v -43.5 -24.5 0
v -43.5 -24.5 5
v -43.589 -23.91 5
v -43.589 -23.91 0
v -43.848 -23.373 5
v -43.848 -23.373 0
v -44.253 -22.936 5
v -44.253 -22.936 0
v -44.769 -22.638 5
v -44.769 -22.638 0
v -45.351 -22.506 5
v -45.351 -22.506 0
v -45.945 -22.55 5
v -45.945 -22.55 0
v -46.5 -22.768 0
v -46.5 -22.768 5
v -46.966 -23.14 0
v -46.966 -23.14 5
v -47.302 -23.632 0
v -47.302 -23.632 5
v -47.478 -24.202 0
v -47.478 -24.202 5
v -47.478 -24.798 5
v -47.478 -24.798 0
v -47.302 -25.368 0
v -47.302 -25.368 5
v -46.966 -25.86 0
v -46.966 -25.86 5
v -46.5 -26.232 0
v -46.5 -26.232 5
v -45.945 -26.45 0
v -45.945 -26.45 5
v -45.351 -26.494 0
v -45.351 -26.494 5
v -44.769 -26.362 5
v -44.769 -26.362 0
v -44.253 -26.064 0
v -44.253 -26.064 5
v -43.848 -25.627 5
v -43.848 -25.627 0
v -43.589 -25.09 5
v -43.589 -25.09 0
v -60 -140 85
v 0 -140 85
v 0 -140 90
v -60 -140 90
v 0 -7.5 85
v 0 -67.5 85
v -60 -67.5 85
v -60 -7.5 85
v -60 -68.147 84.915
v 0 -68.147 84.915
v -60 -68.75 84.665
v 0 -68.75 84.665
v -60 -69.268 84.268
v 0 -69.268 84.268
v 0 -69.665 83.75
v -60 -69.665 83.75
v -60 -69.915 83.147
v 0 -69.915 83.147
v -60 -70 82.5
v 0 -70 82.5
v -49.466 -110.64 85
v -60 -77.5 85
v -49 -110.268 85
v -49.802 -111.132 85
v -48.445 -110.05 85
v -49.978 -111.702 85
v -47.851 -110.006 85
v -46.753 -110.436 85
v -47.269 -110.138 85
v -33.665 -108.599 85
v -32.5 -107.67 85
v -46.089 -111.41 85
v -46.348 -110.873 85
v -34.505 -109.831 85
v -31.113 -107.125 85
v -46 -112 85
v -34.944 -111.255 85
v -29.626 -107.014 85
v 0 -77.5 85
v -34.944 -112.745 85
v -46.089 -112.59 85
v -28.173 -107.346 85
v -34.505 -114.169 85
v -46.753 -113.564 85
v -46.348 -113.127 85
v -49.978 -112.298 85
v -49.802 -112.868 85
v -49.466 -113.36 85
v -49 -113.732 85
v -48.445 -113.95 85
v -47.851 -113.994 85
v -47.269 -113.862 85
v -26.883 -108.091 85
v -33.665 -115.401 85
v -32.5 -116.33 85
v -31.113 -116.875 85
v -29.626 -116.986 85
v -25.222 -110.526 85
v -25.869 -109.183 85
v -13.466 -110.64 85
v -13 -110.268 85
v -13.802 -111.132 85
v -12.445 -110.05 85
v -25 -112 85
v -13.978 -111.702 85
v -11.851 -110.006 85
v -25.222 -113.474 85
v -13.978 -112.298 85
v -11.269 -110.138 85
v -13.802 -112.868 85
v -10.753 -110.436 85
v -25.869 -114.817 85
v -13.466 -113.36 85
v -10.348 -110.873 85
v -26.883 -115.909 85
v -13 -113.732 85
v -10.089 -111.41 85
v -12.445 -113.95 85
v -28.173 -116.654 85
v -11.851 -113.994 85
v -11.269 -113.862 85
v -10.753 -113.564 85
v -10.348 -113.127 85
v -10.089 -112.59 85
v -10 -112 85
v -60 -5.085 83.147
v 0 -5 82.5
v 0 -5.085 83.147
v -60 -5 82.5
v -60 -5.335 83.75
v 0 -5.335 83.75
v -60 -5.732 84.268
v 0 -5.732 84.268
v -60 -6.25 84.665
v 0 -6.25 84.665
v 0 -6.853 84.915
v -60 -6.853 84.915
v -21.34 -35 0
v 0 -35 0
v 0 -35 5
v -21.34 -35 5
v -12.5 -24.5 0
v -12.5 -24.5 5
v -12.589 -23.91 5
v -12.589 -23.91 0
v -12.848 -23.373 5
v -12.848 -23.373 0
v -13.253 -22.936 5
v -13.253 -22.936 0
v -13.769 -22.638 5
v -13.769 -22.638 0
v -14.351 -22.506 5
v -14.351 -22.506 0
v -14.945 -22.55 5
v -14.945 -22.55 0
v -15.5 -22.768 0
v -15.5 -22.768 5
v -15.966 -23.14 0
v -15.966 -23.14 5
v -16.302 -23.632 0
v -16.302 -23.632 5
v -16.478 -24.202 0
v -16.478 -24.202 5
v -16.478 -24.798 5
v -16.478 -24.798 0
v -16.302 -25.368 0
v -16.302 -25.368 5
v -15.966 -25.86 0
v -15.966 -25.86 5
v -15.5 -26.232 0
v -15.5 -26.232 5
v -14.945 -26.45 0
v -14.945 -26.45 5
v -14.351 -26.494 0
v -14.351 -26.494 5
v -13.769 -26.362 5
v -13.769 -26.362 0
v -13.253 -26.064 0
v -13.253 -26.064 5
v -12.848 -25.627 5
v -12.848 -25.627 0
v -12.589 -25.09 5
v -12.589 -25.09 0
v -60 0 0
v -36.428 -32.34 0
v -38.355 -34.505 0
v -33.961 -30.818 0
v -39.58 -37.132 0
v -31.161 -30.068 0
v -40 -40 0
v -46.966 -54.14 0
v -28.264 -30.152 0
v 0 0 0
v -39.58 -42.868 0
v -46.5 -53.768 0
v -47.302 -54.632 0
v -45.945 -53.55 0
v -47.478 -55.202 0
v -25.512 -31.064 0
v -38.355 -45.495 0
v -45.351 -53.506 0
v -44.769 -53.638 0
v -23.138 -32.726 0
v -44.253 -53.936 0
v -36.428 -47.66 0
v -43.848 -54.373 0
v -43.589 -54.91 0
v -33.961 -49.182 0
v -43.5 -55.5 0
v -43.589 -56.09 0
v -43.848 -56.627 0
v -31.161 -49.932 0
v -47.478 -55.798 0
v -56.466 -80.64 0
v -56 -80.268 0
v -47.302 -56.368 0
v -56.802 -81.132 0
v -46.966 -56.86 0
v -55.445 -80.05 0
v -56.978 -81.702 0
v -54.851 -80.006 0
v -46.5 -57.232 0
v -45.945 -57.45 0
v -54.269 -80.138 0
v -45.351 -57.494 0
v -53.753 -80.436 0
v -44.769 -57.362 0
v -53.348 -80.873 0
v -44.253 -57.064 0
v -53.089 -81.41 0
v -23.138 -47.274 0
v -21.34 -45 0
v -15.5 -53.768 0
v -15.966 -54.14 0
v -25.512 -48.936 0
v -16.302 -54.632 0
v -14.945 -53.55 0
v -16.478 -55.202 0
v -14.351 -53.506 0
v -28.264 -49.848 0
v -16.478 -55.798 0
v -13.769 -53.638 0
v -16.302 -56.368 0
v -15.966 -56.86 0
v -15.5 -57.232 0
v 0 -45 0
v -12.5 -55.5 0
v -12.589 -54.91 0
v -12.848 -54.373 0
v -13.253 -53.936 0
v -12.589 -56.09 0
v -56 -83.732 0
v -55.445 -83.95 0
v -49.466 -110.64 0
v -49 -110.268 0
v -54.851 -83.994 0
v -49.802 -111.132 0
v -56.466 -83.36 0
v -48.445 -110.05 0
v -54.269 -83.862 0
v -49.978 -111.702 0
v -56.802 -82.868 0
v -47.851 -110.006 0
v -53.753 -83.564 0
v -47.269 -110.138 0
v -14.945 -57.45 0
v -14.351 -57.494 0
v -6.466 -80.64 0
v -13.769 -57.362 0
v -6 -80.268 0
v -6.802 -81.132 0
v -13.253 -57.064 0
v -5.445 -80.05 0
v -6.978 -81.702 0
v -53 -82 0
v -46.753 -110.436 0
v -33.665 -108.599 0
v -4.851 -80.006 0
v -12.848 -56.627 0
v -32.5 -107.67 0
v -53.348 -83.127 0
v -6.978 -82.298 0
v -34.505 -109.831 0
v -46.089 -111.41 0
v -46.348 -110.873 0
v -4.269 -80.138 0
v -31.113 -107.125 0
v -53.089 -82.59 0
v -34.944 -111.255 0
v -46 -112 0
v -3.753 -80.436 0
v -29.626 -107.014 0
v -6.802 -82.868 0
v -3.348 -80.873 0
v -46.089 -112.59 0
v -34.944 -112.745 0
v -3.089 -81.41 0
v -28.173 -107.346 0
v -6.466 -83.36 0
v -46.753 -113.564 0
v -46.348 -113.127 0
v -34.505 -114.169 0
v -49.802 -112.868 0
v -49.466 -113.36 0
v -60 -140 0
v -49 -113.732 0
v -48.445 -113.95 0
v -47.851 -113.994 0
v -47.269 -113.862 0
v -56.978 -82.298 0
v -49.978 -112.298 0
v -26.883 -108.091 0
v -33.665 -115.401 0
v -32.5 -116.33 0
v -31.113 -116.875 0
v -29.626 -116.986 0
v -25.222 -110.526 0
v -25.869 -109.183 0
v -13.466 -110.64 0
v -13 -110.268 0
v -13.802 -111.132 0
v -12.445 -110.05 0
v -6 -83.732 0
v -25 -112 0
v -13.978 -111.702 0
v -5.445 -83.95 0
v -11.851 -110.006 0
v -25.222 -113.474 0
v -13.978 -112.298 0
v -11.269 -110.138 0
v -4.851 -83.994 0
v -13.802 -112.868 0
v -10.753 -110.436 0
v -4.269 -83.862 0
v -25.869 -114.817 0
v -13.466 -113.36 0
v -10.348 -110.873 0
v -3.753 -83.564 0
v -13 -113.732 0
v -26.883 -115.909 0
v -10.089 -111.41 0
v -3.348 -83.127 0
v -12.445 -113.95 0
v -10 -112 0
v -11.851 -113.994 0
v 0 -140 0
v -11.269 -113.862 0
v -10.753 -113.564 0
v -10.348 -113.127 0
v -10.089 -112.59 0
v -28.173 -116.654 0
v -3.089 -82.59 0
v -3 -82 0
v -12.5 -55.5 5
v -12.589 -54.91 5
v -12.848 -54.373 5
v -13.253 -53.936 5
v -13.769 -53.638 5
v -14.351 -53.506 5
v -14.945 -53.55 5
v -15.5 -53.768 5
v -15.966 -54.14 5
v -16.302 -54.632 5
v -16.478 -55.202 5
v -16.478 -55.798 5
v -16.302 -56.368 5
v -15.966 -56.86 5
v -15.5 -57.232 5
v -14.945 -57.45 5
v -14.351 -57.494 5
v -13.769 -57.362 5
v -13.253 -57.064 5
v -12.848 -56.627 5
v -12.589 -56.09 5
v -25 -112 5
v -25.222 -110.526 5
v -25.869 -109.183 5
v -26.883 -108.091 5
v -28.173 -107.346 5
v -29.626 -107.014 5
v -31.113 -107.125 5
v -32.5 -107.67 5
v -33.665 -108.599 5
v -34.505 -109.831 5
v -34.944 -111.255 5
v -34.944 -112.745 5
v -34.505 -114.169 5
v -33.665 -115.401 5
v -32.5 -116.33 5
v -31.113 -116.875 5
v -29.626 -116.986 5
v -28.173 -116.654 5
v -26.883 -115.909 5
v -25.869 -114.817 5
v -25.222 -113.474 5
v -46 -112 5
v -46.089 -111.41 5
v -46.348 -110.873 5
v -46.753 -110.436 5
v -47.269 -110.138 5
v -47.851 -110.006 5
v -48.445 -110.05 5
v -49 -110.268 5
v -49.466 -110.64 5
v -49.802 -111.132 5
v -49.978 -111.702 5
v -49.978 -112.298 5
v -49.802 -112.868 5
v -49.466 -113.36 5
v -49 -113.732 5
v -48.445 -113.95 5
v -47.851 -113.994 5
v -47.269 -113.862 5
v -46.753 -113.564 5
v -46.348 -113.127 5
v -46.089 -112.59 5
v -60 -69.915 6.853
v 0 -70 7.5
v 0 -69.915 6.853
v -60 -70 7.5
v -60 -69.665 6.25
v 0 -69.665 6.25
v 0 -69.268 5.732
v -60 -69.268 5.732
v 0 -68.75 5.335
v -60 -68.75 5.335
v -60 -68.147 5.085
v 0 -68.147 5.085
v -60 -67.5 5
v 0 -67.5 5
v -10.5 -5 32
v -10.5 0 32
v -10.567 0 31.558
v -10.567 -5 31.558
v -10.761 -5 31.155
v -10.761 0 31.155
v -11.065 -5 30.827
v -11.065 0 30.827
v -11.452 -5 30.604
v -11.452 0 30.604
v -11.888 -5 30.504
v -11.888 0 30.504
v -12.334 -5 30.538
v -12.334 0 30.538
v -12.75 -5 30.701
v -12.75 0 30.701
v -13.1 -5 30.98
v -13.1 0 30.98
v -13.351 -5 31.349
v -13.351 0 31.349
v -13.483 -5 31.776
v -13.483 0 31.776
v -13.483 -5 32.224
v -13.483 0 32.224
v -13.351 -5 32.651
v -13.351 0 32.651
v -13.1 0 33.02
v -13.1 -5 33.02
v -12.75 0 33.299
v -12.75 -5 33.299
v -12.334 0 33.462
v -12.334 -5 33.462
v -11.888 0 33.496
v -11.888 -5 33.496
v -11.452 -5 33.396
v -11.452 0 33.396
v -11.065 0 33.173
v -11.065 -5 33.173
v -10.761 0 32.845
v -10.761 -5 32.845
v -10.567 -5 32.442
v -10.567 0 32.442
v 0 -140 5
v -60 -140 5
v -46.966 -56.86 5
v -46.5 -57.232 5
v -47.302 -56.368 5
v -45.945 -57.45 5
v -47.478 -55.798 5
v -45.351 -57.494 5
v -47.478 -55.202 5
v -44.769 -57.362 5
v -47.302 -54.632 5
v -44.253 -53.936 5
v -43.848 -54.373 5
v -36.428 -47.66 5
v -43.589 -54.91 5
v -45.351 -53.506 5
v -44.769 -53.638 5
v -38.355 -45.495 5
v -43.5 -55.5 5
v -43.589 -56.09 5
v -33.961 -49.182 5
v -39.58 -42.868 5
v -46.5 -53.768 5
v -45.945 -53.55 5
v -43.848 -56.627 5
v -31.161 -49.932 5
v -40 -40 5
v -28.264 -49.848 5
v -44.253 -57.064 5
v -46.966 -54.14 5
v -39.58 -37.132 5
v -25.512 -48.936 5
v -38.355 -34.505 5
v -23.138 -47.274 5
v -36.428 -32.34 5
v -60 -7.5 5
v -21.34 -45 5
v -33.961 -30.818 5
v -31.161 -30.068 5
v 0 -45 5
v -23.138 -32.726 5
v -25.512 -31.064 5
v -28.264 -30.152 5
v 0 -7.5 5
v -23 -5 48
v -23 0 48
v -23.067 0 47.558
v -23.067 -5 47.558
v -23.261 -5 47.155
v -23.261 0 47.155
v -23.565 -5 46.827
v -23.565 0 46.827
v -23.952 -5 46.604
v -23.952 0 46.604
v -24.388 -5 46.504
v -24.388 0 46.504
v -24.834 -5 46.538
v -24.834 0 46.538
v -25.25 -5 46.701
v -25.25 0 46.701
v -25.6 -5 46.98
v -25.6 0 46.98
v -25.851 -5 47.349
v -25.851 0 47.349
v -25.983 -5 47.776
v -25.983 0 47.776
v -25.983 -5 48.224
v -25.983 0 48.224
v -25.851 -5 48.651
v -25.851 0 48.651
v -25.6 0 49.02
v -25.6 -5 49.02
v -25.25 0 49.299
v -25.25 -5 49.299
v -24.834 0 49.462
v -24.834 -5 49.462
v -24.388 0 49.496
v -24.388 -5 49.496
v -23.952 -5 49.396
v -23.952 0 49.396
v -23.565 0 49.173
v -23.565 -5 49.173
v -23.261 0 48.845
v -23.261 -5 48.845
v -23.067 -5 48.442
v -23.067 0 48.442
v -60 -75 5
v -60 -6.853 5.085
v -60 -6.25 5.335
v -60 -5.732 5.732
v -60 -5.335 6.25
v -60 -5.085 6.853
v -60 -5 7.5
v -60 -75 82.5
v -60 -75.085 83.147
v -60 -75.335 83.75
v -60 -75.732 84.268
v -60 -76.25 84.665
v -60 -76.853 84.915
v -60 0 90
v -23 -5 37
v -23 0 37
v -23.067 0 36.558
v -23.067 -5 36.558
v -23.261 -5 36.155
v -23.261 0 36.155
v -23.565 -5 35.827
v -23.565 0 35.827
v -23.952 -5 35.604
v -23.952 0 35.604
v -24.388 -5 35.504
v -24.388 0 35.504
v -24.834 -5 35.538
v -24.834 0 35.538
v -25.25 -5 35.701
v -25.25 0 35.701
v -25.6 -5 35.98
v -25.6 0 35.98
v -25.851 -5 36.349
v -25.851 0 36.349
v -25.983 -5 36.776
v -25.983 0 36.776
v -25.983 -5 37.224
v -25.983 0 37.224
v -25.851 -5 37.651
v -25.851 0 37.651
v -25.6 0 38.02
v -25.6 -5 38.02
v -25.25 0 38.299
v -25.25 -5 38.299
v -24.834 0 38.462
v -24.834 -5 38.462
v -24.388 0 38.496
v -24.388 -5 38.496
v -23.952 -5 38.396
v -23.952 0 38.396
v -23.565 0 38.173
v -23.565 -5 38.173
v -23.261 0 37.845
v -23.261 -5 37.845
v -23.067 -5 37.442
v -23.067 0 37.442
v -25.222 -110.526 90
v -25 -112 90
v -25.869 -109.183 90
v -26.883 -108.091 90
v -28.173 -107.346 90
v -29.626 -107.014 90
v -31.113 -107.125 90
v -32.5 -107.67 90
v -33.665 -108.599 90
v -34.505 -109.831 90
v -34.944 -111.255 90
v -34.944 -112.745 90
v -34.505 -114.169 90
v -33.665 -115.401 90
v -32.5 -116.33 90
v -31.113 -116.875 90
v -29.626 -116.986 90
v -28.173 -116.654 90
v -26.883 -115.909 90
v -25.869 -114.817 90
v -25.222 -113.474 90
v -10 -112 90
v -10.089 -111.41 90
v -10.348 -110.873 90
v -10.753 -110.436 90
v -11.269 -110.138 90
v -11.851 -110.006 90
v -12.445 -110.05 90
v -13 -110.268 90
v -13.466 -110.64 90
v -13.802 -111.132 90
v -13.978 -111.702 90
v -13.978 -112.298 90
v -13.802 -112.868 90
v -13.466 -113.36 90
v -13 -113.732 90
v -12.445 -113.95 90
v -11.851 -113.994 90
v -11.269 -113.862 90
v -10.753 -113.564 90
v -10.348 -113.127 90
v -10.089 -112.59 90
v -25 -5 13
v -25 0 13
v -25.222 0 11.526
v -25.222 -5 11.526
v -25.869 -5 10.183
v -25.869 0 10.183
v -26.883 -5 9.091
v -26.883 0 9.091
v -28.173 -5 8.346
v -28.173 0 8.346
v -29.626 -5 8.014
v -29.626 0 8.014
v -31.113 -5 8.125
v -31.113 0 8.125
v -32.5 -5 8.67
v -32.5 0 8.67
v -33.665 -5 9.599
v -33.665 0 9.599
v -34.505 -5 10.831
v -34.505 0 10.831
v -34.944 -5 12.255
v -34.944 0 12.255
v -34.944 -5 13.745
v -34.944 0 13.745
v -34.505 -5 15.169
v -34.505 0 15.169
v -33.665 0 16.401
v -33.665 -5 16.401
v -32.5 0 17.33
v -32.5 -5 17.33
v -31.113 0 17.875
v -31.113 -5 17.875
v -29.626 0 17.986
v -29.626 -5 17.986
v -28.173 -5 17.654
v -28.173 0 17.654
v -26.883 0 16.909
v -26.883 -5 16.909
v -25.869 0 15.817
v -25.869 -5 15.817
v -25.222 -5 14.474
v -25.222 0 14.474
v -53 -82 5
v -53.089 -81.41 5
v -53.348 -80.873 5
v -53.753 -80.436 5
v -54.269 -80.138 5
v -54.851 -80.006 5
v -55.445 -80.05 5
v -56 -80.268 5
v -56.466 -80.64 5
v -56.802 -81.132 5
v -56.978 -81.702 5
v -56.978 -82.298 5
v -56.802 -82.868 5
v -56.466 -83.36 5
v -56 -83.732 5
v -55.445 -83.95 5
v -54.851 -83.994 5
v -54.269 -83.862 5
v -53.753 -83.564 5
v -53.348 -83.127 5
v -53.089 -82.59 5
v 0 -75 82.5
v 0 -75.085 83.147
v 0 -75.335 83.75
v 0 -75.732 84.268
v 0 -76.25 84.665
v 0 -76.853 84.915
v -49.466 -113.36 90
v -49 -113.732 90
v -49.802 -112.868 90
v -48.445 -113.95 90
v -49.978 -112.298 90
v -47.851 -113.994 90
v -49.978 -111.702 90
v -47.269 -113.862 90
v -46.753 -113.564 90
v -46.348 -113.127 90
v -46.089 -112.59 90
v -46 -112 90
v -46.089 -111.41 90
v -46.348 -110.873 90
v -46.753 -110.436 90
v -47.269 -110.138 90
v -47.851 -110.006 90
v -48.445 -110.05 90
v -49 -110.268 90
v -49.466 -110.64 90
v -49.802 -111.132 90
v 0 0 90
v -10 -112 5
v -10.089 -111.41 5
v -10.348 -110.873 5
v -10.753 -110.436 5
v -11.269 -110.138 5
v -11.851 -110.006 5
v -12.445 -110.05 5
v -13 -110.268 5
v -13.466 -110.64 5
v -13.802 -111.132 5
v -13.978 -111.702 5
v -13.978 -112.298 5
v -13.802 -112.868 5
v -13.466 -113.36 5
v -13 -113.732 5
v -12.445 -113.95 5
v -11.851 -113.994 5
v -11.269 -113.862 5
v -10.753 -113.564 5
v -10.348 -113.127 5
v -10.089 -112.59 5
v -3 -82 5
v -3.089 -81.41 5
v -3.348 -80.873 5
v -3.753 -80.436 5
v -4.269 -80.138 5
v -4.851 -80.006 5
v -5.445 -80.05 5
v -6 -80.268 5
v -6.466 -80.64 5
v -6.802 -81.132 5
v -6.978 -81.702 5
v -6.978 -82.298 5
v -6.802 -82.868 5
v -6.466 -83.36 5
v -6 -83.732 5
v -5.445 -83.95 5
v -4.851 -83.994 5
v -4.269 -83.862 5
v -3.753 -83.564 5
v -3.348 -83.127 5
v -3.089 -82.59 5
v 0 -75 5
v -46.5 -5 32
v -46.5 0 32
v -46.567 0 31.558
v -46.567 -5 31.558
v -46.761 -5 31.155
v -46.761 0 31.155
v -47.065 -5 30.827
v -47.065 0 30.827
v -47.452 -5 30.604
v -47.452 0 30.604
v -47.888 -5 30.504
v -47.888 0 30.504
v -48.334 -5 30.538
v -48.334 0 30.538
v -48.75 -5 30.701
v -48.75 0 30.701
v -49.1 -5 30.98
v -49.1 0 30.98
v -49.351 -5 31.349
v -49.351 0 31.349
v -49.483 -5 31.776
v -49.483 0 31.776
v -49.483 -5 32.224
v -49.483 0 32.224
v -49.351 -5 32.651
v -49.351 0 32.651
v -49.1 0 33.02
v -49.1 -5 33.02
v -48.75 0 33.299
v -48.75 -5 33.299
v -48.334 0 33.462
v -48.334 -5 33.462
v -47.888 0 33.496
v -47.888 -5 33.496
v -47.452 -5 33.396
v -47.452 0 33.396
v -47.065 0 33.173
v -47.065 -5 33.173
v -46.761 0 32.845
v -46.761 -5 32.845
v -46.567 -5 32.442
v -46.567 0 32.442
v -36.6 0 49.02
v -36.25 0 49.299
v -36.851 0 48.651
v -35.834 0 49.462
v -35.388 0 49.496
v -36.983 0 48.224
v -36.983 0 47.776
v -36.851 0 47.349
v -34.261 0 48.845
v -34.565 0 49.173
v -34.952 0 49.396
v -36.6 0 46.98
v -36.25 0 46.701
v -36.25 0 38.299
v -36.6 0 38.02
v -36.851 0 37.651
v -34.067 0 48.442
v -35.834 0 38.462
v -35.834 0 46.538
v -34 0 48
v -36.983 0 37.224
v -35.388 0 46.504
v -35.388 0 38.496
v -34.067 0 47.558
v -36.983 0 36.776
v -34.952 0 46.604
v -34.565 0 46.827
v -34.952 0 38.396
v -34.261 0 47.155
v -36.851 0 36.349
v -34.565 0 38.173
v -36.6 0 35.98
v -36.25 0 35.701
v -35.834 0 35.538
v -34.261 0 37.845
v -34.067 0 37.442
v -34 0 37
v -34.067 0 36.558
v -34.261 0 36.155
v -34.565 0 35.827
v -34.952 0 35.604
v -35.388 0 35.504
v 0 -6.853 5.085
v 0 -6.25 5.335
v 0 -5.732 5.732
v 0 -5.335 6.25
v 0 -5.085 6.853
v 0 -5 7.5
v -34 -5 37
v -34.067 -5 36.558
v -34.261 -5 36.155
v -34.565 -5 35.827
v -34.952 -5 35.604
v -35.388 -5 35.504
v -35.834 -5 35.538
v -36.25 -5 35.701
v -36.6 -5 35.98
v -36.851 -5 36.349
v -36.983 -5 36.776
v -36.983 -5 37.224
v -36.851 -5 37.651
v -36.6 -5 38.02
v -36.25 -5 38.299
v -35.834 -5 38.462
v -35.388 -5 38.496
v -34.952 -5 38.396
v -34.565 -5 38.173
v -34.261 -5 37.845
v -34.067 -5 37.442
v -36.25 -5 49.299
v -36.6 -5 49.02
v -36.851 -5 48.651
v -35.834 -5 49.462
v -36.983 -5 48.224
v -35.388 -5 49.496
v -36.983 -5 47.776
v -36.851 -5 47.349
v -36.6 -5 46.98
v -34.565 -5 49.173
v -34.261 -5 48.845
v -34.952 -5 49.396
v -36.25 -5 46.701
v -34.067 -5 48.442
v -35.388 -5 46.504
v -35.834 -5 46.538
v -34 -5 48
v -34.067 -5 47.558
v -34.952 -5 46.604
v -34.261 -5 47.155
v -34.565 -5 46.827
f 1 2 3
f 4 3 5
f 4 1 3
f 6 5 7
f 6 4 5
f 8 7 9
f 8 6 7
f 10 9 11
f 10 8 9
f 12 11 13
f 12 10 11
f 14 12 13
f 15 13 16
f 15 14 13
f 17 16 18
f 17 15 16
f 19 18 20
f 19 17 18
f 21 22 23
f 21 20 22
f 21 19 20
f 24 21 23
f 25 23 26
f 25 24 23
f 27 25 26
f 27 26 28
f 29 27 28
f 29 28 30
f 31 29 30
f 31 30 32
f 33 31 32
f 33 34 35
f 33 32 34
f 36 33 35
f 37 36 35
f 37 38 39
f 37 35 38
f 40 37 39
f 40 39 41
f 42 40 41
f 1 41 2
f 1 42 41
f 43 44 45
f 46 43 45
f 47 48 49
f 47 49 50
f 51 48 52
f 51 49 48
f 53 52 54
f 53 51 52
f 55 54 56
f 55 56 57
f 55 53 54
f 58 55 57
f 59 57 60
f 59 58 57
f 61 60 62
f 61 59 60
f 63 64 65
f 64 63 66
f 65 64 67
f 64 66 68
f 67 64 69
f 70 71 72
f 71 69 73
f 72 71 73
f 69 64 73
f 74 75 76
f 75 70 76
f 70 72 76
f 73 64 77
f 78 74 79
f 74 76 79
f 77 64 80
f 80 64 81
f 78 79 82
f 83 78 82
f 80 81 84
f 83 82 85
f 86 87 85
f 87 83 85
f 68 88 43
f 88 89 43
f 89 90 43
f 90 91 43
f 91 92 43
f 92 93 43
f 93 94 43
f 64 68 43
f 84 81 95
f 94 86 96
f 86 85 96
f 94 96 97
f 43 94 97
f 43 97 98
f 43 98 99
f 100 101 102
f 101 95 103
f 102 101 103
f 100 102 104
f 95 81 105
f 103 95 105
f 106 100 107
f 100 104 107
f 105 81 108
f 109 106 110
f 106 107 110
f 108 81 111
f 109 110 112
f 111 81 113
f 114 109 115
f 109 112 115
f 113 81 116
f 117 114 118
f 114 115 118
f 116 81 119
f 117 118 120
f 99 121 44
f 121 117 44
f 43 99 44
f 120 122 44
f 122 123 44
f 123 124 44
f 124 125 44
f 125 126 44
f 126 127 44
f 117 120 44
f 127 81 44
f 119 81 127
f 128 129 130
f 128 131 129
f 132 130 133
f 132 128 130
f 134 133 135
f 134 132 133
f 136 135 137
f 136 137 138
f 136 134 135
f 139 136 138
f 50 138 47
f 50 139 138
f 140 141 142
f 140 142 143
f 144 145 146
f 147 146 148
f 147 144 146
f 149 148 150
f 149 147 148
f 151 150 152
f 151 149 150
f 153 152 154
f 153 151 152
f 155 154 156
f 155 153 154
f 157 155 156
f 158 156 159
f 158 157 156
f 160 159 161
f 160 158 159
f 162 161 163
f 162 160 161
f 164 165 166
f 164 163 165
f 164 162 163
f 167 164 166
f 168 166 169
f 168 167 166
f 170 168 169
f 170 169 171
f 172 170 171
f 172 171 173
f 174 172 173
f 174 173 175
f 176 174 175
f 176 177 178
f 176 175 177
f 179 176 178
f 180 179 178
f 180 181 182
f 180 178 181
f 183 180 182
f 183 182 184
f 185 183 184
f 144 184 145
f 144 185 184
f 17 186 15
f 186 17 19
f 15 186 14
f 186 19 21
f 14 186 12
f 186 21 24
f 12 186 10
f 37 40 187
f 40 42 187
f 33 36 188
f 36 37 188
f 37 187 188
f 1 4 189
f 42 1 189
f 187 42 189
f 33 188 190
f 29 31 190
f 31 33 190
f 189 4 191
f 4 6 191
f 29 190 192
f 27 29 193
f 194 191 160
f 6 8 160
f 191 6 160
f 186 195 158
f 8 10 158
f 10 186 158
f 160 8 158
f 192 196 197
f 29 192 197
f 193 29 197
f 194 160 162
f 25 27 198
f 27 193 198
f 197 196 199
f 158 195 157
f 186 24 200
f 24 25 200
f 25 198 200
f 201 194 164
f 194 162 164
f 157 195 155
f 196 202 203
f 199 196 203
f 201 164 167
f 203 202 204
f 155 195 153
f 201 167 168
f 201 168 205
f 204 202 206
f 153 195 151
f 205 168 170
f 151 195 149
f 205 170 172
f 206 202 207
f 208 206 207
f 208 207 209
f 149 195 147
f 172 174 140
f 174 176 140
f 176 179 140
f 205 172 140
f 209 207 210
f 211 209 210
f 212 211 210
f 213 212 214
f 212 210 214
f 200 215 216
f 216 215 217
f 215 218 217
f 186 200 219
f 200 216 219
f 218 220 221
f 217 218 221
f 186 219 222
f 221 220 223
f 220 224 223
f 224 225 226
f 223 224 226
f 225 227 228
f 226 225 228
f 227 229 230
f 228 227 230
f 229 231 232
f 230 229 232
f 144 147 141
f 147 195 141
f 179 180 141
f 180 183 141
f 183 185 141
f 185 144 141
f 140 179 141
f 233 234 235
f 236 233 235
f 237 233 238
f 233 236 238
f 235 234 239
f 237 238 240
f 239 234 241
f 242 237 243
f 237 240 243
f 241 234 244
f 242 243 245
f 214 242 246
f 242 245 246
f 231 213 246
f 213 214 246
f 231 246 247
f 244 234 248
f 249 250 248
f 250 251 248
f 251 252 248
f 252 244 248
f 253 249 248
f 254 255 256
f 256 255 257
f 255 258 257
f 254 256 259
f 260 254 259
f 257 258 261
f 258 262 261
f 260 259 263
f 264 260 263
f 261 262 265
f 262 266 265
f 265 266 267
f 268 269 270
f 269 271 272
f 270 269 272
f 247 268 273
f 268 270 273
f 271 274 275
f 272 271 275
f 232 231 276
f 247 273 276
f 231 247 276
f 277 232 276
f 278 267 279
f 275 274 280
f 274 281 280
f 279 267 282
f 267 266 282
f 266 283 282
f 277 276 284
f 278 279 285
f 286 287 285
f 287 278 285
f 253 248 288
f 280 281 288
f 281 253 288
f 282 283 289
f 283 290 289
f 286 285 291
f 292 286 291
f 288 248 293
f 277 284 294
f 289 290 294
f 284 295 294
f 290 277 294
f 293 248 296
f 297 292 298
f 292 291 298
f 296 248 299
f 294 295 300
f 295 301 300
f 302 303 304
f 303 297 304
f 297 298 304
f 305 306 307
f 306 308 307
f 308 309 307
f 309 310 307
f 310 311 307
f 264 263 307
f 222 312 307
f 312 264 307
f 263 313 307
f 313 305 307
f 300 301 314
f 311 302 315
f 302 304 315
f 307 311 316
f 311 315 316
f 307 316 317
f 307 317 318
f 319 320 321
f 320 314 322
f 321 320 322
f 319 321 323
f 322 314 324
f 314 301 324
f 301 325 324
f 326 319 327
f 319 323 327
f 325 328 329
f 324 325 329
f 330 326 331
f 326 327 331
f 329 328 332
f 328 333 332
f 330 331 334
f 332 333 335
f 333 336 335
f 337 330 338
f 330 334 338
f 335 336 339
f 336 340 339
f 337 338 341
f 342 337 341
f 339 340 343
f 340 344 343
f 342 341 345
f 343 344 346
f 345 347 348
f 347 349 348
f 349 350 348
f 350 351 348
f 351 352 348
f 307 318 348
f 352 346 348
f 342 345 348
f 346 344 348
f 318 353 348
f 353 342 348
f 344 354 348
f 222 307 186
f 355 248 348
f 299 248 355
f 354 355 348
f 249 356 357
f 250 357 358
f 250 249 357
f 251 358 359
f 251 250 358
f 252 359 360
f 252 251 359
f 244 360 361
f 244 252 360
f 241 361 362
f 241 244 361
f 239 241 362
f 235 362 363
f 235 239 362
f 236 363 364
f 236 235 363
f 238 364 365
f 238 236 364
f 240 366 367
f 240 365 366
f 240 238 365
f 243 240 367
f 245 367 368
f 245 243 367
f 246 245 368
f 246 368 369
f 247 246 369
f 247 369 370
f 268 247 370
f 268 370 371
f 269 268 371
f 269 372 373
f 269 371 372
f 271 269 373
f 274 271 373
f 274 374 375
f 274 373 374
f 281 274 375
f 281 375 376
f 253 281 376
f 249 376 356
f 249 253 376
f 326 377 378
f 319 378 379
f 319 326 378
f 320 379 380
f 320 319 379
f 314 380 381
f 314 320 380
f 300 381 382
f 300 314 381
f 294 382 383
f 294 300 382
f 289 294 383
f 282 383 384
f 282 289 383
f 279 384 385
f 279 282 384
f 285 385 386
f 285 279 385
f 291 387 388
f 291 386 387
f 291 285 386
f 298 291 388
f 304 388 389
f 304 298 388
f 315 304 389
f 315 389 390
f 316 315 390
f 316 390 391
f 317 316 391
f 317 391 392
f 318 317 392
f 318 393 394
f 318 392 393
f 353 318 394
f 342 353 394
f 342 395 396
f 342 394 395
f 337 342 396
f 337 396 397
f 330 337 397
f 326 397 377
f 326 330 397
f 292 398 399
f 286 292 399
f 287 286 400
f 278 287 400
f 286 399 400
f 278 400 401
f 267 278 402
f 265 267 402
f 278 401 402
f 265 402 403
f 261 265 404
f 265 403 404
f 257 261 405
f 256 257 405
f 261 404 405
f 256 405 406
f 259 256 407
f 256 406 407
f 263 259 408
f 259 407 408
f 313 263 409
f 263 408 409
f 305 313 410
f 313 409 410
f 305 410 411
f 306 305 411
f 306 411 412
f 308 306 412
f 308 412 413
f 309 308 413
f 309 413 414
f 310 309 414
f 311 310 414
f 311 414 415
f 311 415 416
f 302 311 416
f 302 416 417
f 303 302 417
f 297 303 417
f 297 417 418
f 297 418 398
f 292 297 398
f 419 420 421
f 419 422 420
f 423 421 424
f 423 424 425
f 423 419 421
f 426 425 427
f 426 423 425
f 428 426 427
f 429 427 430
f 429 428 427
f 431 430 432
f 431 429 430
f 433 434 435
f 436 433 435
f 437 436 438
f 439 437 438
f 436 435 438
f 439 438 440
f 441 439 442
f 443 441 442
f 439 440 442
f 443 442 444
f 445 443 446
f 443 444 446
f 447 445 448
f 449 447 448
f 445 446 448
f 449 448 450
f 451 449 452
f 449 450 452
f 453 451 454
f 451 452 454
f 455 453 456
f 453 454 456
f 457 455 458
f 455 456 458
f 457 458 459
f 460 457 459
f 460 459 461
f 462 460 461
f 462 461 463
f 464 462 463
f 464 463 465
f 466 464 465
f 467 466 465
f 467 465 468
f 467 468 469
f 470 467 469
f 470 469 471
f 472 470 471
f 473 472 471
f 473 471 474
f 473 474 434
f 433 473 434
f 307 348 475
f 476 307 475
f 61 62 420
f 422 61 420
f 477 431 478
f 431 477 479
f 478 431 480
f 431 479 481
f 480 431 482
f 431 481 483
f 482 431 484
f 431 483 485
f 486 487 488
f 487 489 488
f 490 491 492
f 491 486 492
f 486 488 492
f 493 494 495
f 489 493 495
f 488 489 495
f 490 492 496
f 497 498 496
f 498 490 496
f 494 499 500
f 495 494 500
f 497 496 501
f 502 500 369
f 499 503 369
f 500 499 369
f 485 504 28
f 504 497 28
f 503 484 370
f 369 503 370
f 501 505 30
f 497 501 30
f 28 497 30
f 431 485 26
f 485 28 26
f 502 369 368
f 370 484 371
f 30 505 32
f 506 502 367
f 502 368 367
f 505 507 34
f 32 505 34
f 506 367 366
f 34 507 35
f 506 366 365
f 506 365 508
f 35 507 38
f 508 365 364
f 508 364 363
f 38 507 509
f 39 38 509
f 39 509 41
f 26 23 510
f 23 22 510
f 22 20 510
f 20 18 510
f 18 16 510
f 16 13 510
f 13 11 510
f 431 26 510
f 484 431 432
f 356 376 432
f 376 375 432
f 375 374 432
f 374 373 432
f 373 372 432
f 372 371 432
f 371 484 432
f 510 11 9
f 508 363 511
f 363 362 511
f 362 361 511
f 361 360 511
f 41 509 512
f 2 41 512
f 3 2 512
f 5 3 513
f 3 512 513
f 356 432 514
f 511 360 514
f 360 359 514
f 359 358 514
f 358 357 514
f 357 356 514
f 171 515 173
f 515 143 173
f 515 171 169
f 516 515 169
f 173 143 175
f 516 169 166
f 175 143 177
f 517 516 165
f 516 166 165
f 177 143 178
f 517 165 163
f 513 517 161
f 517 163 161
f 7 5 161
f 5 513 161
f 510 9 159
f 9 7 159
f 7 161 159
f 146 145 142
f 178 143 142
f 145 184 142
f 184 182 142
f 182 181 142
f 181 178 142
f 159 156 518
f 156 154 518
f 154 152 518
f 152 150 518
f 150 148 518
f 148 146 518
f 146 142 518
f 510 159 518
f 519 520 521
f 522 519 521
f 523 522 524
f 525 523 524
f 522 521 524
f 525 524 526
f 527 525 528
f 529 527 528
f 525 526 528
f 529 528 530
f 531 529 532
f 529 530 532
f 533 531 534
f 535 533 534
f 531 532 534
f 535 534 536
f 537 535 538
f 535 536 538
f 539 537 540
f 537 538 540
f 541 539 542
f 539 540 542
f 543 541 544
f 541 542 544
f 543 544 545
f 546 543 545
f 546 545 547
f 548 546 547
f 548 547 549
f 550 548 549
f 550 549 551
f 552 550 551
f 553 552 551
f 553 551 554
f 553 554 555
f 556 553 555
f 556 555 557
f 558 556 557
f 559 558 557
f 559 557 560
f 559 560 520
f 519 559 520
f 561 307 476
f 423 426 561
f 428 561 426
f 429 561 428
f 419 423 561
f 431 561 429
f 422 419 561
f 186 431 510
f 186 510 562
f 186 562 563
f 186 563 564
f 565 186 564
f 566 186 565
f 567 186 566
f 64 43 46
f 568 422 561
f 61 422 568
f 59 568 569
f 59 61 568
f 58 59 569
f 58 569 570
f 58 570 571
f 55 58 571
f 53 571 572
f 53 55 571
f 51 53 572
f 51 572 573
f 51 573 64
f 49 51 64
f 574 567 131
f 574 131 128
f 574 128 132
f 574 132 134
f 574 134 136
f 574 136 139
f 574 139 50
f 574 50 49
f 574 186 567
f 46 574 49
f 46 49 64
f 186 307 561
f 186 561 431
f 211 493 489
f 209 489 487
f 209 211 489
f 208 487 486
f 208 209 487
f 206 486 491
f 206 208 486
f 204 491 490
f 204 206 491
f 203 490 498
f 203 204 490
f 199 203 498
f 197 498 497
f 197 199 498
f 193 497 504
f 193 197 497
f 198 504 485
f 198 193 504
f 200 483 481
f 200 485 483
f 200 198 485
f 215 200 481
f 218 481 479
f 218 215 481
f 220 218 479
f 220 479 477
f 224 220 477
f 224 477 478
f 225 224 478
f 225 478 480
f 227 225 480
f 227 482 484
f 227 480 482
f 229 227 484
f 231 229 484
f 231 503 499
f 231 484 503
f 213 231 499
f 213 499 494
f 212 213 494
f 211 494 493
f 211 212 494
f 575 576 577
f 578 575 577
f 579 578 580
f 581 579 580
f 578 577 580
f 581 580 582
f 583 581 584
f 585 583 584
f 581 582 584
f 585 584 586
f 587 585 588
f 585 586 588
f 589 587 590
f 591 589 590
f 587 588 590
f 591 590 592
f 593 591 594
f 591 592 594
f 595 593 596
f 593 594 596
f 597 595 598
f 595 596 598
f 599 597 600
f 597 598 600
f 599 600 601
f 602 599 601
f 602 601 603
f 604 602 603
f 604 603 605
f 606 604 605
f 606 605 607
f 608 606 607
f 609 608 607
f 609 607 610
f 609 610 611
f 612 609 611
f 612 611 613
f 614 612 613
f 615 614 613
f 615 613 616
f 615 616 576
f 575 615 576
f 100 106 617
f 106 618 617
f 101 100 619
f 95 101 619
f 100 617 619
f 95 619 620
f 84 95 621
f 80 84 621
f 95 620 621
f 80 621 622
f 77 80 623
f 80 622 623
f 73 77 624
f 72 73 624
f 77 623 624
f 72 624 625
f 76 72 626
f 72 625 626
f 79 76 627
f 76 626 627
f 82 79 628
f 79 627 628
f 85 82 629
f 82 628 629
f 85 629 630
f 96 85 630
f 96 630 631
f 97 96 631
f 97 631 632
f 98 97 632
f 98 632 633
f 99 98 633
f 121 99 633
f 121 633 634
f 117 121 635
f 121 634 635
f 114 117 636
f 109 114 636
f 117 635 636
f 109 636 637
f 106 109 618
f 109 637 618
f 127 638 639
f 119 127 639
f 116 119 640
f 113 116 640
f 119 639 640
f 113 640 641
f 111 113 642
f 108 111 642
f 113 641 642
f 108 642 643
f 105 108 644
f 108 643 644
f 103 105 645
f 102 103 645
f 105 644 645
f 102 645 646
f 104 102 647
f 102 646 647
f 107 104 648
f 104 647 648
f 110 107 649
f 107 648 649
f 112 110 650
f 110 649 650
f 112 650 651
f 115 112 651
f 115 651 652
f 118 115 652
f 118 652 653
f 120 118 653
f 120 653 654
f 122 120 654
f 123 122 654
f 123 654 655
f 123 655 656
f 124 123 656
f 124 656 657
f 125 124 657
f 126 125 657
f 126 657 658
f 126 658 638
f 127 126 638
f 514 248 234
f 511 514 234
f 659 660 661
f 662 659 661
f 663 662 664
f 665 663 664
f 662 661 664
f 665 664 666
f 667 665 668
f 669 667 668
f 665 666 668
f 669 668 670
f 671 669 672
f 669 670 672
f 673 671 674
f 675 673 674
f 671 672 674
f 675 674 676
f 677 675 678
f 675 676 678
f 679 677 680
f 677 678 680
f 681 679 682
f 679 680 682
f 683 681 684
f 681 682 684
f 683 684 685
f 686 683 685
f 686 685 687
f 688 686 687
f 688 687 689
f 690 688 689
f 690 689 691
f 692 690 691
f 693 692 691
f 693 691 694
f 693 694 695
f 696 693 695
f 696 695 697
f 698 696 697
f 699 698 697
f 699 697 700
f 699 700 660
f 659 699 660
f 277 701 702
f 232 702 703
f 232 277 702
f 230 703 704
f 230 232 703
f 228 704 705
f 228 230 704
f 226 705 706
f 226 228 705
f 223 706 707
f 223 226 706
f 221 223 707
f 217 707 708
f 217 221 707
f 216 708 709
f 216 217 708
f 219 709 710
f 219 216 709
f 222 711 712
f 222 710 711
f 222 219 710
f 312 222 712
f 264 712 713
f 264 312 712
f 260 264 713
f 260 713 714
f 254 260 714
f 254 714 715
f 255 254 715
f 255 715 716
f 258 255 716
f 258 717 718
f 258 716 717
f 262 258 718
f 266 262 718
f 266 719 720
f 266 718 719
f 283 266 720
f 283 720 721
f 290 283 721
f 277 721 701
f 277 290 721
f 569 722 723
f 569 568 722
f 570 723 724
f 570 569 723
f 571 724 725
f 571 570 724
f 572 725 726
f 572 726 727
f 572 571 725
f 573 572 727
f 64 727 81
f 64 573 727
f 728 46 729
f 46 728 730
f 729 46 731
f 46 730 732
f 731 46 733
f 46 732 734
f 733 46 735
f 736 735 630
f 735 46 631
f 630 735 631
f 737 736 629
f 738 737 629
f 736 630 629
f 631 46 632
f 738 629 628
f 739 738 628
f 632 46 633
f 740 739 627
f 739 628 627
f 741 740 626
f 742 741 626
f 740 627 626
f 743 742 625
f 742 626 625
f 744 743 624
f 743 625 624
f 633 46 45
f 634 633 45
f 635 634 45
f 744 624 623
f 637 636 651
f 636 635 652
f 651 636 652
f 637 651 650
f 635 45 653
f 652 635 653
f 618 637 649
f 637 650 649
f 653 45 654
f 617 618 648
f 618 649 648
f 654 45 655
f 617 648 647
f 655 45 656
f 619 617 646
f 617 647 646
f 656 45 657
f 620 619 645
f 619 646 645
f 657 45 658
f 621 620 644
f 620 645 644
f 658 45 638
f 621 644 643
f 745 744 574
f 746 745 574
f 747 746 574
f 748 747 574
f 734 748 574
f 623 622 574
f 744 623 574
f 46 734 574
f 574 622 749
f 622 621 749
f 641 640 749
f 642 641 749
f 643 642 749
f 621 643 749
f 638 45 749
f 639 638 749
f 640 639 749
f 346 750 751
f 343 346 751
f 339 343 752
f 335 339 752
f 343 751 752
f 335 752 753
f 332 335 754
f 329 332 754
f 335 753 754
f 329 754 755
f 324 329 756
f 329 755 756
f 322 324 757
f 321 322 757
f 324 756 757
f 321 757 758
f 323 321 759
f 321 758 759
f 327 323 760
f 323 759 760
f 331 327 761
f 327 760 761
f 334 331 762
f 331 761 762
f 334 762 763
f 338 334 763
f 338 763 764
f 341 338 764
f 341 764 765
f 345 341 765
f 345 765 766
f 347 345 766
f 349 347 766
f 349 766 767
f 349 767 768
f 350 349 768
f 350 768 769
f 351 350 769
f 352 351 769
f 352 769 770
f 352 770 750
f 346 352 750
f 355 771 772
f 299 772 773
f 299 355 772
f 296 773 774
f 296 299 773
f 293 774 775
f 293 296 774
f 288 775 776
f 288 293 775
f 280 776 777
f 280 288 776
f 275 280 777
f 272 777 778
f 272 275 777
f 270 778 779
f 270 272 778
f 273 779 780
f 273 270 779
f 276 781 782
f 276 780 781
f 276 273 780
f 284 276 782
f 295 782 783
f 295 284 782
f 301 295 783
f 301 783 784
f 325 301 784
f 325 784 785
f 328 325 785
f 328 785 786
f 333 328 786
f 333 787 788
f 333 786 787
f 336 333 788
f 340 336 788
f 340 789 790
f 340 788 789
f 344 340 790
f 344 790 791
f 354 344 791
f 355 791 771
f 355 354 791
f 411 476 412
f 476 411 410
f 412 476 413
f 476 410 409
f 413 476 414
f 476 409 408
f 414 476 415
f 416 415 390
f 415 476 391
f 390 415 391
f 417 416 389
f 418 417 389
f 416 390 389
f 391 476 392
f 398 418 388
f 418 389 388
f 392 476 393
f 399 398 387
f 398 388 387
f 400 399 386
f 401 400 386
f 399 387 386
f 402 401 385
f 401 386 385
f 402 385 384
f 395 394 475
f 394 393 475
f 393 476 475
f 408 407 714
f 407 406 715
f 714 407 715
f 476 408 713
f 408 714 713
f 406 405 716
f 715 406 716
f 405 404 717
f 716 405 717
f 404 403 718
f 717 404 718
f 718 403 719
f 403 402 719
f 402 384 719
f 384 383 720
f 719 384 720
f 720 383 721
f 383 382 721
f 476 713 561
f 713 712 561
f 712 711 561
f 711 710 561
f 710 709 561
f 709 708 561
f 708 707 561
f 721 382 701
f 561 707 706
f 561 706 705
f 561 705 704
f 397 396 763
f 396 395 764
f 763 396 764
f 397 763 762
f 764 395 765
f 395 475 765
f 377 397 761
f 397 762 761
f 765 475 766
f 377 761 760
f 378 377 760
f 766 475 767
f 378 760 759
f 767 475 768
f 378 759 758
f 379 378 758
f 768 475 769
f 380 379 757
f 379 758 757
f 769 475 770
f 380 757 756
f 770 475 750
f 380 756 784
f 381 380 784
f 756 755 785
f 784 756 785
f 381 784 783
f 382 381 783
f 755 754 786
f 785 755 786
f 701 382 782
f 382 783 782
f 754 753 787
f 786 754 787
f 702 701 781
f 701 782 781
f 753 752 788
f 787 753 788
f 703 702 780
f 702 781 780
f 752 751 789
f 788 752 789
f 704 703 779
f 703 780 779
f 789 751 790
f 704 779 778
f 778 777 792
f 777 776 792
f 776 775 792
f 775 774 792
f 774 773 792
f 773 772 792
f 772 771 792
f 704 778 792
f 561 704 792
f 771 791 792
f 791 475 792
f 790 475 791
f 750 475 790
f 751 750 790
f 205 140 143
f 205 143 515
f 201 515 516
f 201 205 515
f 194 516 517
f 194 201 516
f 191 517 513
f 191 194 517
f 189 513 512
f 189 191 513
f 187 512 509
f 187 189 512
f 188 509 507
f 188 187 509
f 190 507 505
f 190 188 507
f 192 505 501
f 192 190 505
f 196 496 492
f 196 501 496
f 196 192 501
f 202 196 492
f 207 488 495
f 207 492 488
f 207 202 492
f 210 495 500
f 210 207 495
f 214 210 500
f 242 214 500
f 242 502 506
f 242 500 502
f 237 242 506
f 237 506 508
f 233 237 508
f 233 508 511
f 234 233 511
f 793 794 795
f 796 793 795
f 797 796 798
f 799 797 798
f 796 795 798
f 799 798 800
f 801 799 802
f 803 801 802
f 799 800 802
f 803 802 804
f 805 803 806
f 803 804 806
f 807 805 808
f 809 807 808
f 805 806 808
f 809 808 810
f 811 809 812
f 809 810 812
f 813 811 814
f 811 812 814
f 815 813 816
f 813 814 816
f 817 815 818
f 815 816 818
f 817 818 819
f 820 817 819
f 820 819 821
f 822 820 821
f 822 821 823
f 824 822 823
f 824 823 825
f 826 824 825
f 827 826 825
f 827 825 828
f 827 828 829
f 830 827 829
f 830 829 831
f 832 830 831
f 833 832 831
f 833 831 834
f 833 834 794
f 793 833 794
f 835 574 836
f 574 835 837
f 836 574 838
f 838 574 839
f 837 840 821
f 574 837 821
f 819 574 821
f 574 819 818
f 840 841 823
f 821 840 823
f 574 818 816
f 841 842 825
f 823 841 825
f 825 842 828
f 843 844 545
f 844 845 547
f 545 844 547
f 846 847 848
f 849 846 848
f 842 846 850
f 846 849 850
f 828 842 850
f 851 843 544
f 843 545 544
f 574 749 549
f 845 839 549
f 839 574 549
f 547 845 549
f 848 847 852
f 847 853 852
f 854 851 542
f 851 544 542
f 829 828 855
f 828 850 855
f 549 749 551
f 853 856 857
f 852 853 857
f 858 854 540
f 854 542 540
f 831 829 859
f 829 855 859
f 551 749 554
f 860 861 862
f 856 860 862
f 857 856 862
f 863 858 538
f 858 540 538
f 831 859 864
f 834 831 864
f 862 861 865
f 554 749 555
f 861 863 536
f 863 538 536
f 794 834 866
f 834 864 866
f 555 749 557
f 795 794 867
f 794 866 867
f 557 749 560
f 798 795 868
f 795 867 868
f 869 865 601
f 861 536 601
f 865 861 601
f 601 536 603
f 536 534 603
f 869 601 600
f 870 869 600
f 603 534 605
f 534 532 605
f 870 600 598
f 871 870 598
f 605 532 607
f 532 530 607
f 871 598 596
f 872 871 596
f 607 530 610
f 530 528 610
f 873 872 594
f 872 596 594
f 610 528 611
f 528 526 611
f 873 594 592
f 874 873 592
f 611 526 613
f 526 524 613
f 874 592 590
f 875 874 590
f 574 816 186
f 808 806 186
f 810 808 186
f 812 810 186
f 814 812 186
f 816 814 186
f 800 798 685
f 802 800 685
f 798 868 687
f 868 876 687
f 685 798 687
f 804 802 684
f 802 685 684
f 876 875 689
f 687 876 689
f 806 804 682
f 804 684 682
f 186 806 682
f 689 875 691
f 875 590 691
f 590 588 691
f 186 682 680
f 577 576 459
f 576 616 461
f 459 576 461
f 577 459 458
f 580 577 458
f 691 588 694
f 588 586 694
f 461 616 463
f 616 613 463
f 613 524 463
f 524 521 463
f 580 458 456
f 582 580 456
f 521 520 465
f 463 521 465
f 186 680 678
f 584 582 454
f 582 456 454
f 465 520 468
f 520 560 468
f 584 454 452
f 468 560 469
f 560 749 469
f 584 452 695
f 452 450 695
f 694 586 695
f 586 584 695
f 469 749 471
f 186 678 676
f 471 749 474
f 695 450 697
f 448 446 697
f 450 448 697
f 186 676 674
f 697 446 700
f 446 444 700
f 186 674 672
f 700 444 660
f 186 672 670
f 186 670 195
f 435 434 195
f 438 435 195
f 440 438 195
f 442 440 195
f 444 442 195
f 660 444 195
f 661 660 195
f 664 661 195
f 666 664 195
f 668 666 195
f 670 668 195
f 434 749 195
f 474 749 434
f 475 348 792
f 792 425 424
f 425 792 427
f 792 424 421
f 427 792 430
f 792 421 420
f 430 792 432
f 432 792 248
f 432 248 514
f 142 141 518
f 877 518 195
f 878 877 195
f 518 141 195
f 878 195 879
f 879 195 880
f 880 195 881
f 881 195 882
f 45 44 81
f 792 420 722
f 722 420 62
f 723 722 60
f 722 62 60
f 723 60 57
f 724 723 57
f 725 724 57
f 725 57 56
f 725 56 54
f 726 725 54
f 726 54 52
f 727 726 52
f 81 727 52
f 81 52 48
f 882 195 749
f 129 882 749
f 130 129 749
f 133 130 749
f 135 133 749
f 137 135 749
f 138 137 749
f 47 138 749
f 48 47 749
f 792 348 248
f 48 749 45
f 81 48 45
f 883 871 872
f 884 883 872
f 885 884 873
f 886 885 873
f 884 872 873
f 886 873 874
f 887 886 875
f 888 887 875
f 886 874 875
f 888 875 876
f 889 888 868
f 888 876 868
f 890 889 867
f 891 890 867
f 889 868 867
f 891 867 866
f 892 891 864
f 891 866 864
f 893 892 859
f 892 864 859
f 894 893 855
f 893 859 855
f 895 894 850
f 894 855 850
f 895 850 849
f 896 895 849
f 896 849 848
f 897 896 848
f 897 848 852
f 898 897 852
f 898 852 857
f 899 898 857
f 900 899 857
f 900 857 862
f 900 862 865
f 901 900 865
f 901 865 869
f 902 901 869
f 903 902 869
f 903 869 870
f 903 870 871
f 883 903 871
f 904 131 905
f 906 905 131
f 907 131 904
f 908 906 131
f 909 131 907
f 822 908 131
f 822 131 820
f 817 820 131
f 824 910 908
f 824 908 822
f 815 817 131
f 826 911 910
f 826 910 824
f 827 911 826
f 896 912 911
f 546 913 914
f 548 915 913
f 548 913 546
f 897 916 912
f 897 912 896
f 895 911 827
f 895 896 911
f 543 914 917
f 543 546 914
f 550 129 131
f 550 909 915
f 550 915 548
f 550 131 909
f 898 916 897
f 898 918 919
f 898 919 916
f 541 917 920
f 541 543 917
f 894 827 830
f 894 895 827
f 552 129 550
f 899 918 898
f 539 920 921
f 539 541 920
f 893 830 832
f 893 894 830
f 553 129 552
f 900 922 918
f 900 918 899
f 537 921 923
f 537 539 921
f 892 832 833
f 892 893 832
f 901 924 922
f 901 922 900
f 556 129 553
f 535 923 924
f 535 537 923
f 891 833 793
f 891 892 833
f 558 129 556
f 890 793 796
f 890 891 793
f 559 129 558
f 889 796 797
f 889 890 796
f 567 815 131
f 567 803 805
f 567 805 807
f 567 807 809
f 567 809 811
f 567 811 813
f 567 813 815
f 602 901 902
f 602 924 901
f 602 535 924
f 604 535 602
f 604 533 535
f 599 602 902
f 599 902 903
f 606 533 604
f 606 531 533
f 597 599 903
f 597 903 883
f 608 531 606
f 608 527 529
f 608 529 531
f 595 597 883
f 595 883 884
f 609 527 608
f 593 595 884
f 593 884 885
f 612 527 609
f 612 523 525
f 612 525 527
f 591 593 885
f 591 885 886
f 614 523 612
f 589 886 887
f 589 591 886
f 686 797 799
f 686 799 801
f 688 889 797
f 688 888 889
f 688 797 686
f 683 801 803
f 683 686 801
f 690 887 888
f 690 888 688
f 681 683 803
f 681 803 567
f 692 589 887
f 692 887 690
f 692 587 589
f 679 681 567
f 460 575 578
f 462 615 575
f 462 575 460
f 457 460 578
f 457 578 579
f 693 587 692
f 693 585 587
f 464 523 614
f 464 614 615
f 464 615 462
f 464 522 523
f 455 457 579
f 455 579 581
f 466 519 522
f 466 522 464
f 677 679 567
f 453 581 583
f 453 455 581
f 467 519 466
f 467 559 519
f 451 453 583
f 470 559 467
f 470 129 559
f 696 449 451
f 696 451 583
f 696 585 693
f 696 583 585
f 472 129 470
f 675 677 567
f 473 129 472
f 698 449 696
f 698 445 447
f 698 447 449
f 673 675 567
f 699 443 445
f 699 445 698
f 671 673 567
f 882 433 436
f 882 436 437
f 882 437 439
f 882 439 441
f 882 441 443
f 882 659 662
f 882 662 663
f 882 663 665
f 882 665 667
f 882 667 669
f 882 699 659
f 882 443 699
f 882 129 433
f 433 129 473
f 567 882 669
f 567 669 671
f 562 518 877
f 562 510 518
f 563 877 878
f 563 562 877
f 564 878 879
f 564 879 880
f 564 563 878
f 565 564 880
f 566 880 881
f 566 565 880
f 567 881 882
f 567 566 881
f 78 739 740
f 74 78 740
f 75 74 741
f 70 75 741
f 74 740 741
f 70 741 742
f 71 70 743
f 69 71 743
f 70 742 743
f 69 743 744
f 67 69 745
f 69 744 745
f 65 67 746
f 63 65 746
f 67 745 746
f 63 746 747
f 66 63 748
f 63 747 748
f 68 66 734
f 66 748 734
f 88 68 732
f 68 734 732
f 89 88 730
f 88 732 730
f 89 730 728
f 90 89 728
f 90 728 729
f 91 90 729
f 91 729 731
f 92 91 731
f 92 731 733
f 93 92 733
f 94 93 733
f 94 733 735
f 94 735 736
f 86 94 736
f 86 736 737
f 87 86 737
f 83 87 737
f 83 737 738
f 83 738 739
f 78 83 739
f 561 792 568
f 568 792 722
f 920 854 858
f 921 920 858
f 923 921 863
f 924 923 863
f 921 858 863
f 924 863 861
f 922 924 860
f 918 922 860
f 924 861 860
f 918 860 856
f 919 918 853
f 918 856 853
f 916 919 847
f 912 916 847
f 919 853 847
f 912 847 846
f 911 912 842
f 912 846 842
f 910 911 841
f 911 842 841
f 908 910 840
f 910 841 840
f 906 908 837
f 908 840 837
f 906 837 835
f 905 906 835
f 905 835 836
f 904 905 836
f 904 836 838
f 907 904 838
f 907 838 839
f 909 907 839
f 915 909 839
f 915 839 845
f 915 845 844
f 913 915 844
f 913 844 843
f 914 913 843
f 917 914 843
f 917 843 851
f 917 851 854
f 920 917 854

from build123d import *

# Parameters (mm, degrees)
BOSS_EXTRUDE1_DEPTH = 60
SKETCH2_W           = 80
SKETCH2_H           = 65
CUT_EXTRUDE1_DEPTH  = 60
CUT_EXTRUDE2_REACH  = 142
SKETCH3_R           = 1.5
SKETCH3_R_2         = 5
CUT_EXTRUDE3_REACH  = 92
SKETCH4_R           = 5
SKETCH4_R_2         = 10
SKETCH4_R_3         = 2
FILLET1_R           = 2.5
FILLET3_R           = 2.5
FILLET4_R           = 2.5
FILLET5_R           = 2.5
FILLET6_R           = 2.5
SKETCH5_R           = 5
SKETCH5_R_2         = 2
CUT_EXTRUDE4_DEPTH  = 91
CUT_EXTRUDE5_REACH  = 92
SKETCH6_W           = 30
SKETCH6_H           = 10


with BuildPart() as part:
    # Sketch1 → Boss-Extrude1 (new body)
    with BuildSketch(Plane(origin=(0, 0, 0), x_dir=(0, 0, -1), z_dir=(1, 0, 0))):
        Polygon((0, 0), (0, -140), (-5, -140), (-5, -75), (-85, -75), (-85, -140), (-90, -140), (-90, 0), align=None)
    extrude(amount=-BOSS_EXTRUDE1_DEPTH)

    # Sketch2 → Cut-Extrude1 (cut)
    with BuildSketch(Plane(origin=(0, 0, 0), x_dir=(0, 0, -1), z_dir=(1, 0, 0))):
        with Locations((-45, -37.5)):
            Rectangle(SKETCH2_W, SKETCH2_H)
    extrude(amount=-CUT_EXTRUDE1_DEPTH, mode=Mode.SUBTRACT)

    # Sketch3 → Cut-Extrude2 (cut, up to next)
    with BuildSketch(Plane(origin=(0, 0, 0), x_dir=(1, 0, 0), z_dir=(0, 1, 0)), mode=Mode.PRIVATE) as cut_extrude2_sk1:
        with Locations((-35.5, -37)):
            Circle(SKETCH3_R)
    cut_extrude2_tool1 = extrude(cut_extrude2_sk1.sketch, amount=-CUT_EXTRUDE2_REACH, mode=Mode.PRIVATE) & part.part
    add(cut_extrude2_tool1.solids().sort_by_distance((-35.5, 0, 37))[0], mode=Mode.SUBTRACT)
    # Sketch3 → Cut-Extrude2 (cut, up to next)
    with BuildSketch(Plane(origin=(0, 0, 0), x_dir=(1, 0, 0), z_dir=(0, 1, 0)), mode=Mode.PRIVATE) as cut_extrude2_sk2:
        with Locations((-24.5, -37)):
            Circle(SKETCH3_R)
    cut_extrude2_tool2 = extrude(cut_extrude2_sk2.sketch, amount=-CUT_EXTRUDE2_REACH, mode=Mode.PRIVATE) & part.part
    add(cut_extrude2_tool2.solids().sort_by_distance((-24.5, 0, 37))[0], mode=Mode.SUBTRACT)
    # Sketch3 → Cut-Extrude2 (cut, up to next)
    with BuildSketch(Plane(origin=(0, 0, 0), x_dir=(1, 0, 0), z_dir=(0, 1, 0)), mode=Mode.PRIVATE) as cut_extrude2_sk3:
        with Locations((-24.5, -48)):
            Circle(SKETCH3_R)
    cut_extrude2_tool3 = extrude(cut_extrude2_sk3.sketch, amount=-CUT_EXTRUDE2_REACH, mode=Mode.PRIVATE) & part.part
    add(cut_extrude2_tool3.solids().sort_by_distance((-24.5, 0, 48))[0], mode=Mode.SUBTRACT)
    # Sketch3 → Cut-Extrude2 (cut, up to next)
    with BuildSketch(Plane(origin=(0, 0, 0), x_dir=(1, 0, 0), z_dir=(0, 1, 0)), mode=Mode.PRIVATE) as cut_extrude2_sk4:
        with Locations((-35.5, -48)):
            Circle(SKETCH3_R)
    cut_extrude2_tool4 = extrude(cut_extrude2_sk4.sketch, amount=-CUT_EXTRUDE2_REACH, mode=Mode.PRIVATE) & part.part
    add(cut_extrude2_tool4.solids().sort_by_distance((-35.5, 0, 48))[0], mode=Mode.SUBTRACT)
    # Sketch3 → Cut-Extrude2 (cut, up to next)
    with BuildSketch(Plane(origin=(0, 0, 0), x_dir=(1, 0, 0), z_dir=(0, 1, 0)), mode=Mode.PRIVATE) as cut_extrude2_sk5:
        with Locations((-30, -13)):
            Circle(SKETCH3_R_2)
    cut_extrude2_tool5 = extrude(cut_extrude2_sk5.sketch, amount=-CUT_EXTRUDE2_REACH, mode=Mode.PRIVATE) & part.part
    add(cut_extrude2_tool5.solids().sort_by_distance((-30, 0, 13))[0], mode=Mode.SUBTRACT)
    # Sketch3 → Cut-Extrude2 (cut, up to next)
    with BuildSketch(Plane(origin=(0, 0, 0), x_dir=(1, 0, 0), z_dir=(0, 1, 0)), mode=Mode.PRIVATE) as cut_extrude2_sk6:
        with Locations((-12, -32)):
            Circle(SKETCH3_R)
    cut_extrude2_tool6 = extrude(cut_extrude2_sk6.sketch, amount=-CUT_EXTRUDE2_REACH, mode=Mode.PRIVATE) & part.part
    add(cut_extrude2_tool6.solids().sort_by_distance((-12, 0, 32))[0], mode=Mode.SUBTRACT)
    # Sketch3 → Cut-Extrude2 (cut, up to next)
    with BuildSketch(Plane(origin=(0, 0, 0), x_dir=(1, 0, 0), z_dir=(0, 1, 0)), mode=Mode.PRIVATE) as cut_extrude2_sk7:
        with Locations((-48, -32)):
            Circle(SKETCH3_R)
    cut_extrude2_tool7 = extrude(cut_extrude2_sk7.sketch, amount=-CUT_EXTRUDE2_REACH, mode=Mode.PRIVATE) & part.part
    add(cut_extrude2_tool7.solids().sort_by_distance((-48, 0, 32))[0], mode=Mode.SUBTRACT)

    # Sketch4 → Cut-Extrude3 (cut, up to next)
    with BuildSketch(Plane.XY, mode=Mode.PRIVATE) as cut_extrude3_sk1:
        with Locations((-30, -112)):
            Circle(SKETCH4_R)
    cut_extrude3_tool1 = extrude(cut_extrude3_sk1.sketch, amount=CUT_EXTRUDE3_REACH, mode=Mode.PRIVATE) & part.part
    add(cut_extrude3_tool1.solids().sort_by_distance((-30, -112, 0))[0], mode=Mode.SUBTRACT)
    # Sketch4 → Cut-Extrude3 (cut, up to next)
    with BuildSketch(Plane.XY, mode=Mode.PRIVATE) as cut_extrude3_sk2:
        with Locations((-30, -40)):
            Circle(SKETCH4_R_2)
    cut_extrude3_tool2 = extrude(cut_extrude3_sk2.sketch, amount=CUT_EXTRUDE3_REACH, mode=Mode.PRIVATE) & part.part
    add(cut_extrude3_tool2.solids().sort_by_distance((-30, -40, 0))[0], mode=Mode.SUBTRACT)
    # Sketch4 → Cut-Extrude3 (cut, up to next)
    with BuildSketch(Plane.XY, mode=Mode.PRIVATE) as cut_extrude3_sk3:
        with Locations((-5, -82)):
            Circle(SKETCH4_R_3)
    cut_extrude3_tool3 = extrude(cut_extrude3_sk3.sketch, amount=CUT_EXTRUDE3_REACH, mode=Mode.PRIVATE) & part.part
    add(cut_extrude3_tool3.solids().sort_by_distance((-5, -82, 0))[0], mode=Mode.SUBTRACT)
    # Sketch4 → Cut-Extrude3 (cut, up to next)
    with BuildSketch(Plane.XY, mode=Mode.PRIVATE) as cut_extrude3_sk4:
        with Locations((-55, -82)):
            Circle(SKETCH4_R_3)
    cut_extrude3_tool4 = extrude(cut_extrude3_sk4.sketch, amount=CUT_EXTRUDE3_REACH, mode=Mode.PRIVATE) & part.part
    add(cut_extrude3_tool4.solids().sort_by_distance((-55, -82, 0))[0], mode=Mode.SUBTRACT)
    # Sketch4 → Cut-Extrude3 (cut, up to next)
    with BuildSketch(Plane.XY, mode=Mode.PRIVATE) as cut_extrude3_sk5:
        with Locations((-14.5, -24.5)):
            Circle(SKETCH4_R_3)
    cut_extrude3_tool5 = extrude(cut_extrude3_sk5.sketch, amount=CUT_EXTRUDE3_REACH, mode=Mode.PRIVATE) & part.part
    add(cut_extrude3_tool5.solids().sort_by_distance((-14.5, -24.5, 0))[0], mode=Mode.SUBTRACT)
    # Sketch4 → Cut-Extrude3 (cut, up to next)
    with BuildSketch(Plane.XY, mode=Mode.PRIVATE) as cut_extrude3_sk6:
        with Locations((-45.5, -24.5)):
            Circle(SKETCH4_R_3)
    cut_extrude3_tool6 = extrude(cut_extrude3_sk6.sketch, amount=CUT_EXTRUDE3_REACH, mode=Mode.PRIVATE) & part.part
    add(cut_extrude3_tool6.solids().sort_by_distance((-45.5, -24.5, 0))[0], mode=Mode.SUBTRACT)
    # Sketch4 → Cut-Extrude3 (cut, up to next)
    with BuildSketch(Plane.XY, mode=Mode.PRIVATE) as cut_extrude3_sk7:
        with Locations((-45.5, -55.5)):
            Circle(SKETCH4_R_3)
    cut_extrude3_tool7 = extrude(cut_extrude3_sk7.sketch, amount=CUT_EXTRUDE3_REACH, mode=Mode.PRIVATE) & part.part
    add(cut_extrude3_tool7.solids().sort_by_distance((-45.5, -55.5, 0))[0], mode=Mode.SUBTRACT)
    # Sketch4 → Cut-Extrude3 (cut, up to next)
    with BuildSketch(Plane.XY, mode=Mode.PRIVATE) as cut_extrude3_sk8:
        with Locations((-14.5, -55.5)):
            Circle(SKETCH4_R_3)
    cut_extrude3_tool8 = extrude(cut_extrude3_sk8.sketch, amount=CUT_EXTRUDE3_REACH, mode=Mode.PRIVATE) & part.part
    add(cut_extrude3_tool8.solids().sort_by_distance((-14.5, -55.5, 0))[0], mode=Mode.SUBTRACT)

    # Fillet1
    fillet1_edges = [part.edges().sort_by_distance(p)[0] for p in [
        (-30, -75, 85),
    ]]
    fillet(fillet1_edges, radius=FILLET1_R)

    # Fillet3
    fillet3_edges = [part.edges().sort_by_distance(p)[0] for p in [
        (-30, -70, 85),
    ]]
    fillet(fillet3_edges, radius=FILLET3_R)

    # Fillet4
    fillet4_edges = [part.edges().sort_by_distance(p)[0] for p in [
        (-30, -70, 5),
    ]]
    fillet(fillet4_edges, radius=FILLET4_R)

    # Fillet5
    fillet5_edges = [part.edges().sort_by_distance(p)[0] for p in [
        (-30, -5, 5),
    ]]
    fillet(fillet5_edges, radius=FILLET5_R)

    # Fillet6
    fillet6_edges = [part.edges().sort_by_distance(p)[0] for p in [
        (-30, -5, 85),
    ]]
    fillet(fillet6_edges, radius=FILLET6_R)

    # Sketch5 → Cut-Extrude4 (cut, through all)
    with BuildSketch(Plane.XY.offset(90)):
        with Locations((-30, -112)):
            Circle(SKETCH5_R)
        with Locations((-12, -112)):
            Circle(SKETCH5_R_2)
        with Locations((-48, -112)):
            Circle(SKETCH5_R_2)
    extrude(amount=-CUT_EXTRUDE4_DEPTH, mode=Mode.SUBTRACT)

    # Sketch6 → Cut-Extrude5 (cut, up to next)
    with BuildSketch(Plane(origin=(0, 0, 0), x_dir=(-1, 0, 0), z_dir=(0, 0, -1)), mode=Mode.PRIVATE) as cut_extrude5_sk1:
        with Locations((15, -40)):
            Rectangle(SKETCH6_W, SKETCH6_H)
    cut_extrude5_tool1 = extrude(cut_extrude5_sk1.sketch, amount=-CUT_EXTRUDE5_REACH, mode=Mode.PRIVATE) & part.part
    add(cut_extrude5_tool1.solids().sort_by_distance((-15, -40, 0))[0], mode=Mode.SUBTRACT)


solid = part.part
